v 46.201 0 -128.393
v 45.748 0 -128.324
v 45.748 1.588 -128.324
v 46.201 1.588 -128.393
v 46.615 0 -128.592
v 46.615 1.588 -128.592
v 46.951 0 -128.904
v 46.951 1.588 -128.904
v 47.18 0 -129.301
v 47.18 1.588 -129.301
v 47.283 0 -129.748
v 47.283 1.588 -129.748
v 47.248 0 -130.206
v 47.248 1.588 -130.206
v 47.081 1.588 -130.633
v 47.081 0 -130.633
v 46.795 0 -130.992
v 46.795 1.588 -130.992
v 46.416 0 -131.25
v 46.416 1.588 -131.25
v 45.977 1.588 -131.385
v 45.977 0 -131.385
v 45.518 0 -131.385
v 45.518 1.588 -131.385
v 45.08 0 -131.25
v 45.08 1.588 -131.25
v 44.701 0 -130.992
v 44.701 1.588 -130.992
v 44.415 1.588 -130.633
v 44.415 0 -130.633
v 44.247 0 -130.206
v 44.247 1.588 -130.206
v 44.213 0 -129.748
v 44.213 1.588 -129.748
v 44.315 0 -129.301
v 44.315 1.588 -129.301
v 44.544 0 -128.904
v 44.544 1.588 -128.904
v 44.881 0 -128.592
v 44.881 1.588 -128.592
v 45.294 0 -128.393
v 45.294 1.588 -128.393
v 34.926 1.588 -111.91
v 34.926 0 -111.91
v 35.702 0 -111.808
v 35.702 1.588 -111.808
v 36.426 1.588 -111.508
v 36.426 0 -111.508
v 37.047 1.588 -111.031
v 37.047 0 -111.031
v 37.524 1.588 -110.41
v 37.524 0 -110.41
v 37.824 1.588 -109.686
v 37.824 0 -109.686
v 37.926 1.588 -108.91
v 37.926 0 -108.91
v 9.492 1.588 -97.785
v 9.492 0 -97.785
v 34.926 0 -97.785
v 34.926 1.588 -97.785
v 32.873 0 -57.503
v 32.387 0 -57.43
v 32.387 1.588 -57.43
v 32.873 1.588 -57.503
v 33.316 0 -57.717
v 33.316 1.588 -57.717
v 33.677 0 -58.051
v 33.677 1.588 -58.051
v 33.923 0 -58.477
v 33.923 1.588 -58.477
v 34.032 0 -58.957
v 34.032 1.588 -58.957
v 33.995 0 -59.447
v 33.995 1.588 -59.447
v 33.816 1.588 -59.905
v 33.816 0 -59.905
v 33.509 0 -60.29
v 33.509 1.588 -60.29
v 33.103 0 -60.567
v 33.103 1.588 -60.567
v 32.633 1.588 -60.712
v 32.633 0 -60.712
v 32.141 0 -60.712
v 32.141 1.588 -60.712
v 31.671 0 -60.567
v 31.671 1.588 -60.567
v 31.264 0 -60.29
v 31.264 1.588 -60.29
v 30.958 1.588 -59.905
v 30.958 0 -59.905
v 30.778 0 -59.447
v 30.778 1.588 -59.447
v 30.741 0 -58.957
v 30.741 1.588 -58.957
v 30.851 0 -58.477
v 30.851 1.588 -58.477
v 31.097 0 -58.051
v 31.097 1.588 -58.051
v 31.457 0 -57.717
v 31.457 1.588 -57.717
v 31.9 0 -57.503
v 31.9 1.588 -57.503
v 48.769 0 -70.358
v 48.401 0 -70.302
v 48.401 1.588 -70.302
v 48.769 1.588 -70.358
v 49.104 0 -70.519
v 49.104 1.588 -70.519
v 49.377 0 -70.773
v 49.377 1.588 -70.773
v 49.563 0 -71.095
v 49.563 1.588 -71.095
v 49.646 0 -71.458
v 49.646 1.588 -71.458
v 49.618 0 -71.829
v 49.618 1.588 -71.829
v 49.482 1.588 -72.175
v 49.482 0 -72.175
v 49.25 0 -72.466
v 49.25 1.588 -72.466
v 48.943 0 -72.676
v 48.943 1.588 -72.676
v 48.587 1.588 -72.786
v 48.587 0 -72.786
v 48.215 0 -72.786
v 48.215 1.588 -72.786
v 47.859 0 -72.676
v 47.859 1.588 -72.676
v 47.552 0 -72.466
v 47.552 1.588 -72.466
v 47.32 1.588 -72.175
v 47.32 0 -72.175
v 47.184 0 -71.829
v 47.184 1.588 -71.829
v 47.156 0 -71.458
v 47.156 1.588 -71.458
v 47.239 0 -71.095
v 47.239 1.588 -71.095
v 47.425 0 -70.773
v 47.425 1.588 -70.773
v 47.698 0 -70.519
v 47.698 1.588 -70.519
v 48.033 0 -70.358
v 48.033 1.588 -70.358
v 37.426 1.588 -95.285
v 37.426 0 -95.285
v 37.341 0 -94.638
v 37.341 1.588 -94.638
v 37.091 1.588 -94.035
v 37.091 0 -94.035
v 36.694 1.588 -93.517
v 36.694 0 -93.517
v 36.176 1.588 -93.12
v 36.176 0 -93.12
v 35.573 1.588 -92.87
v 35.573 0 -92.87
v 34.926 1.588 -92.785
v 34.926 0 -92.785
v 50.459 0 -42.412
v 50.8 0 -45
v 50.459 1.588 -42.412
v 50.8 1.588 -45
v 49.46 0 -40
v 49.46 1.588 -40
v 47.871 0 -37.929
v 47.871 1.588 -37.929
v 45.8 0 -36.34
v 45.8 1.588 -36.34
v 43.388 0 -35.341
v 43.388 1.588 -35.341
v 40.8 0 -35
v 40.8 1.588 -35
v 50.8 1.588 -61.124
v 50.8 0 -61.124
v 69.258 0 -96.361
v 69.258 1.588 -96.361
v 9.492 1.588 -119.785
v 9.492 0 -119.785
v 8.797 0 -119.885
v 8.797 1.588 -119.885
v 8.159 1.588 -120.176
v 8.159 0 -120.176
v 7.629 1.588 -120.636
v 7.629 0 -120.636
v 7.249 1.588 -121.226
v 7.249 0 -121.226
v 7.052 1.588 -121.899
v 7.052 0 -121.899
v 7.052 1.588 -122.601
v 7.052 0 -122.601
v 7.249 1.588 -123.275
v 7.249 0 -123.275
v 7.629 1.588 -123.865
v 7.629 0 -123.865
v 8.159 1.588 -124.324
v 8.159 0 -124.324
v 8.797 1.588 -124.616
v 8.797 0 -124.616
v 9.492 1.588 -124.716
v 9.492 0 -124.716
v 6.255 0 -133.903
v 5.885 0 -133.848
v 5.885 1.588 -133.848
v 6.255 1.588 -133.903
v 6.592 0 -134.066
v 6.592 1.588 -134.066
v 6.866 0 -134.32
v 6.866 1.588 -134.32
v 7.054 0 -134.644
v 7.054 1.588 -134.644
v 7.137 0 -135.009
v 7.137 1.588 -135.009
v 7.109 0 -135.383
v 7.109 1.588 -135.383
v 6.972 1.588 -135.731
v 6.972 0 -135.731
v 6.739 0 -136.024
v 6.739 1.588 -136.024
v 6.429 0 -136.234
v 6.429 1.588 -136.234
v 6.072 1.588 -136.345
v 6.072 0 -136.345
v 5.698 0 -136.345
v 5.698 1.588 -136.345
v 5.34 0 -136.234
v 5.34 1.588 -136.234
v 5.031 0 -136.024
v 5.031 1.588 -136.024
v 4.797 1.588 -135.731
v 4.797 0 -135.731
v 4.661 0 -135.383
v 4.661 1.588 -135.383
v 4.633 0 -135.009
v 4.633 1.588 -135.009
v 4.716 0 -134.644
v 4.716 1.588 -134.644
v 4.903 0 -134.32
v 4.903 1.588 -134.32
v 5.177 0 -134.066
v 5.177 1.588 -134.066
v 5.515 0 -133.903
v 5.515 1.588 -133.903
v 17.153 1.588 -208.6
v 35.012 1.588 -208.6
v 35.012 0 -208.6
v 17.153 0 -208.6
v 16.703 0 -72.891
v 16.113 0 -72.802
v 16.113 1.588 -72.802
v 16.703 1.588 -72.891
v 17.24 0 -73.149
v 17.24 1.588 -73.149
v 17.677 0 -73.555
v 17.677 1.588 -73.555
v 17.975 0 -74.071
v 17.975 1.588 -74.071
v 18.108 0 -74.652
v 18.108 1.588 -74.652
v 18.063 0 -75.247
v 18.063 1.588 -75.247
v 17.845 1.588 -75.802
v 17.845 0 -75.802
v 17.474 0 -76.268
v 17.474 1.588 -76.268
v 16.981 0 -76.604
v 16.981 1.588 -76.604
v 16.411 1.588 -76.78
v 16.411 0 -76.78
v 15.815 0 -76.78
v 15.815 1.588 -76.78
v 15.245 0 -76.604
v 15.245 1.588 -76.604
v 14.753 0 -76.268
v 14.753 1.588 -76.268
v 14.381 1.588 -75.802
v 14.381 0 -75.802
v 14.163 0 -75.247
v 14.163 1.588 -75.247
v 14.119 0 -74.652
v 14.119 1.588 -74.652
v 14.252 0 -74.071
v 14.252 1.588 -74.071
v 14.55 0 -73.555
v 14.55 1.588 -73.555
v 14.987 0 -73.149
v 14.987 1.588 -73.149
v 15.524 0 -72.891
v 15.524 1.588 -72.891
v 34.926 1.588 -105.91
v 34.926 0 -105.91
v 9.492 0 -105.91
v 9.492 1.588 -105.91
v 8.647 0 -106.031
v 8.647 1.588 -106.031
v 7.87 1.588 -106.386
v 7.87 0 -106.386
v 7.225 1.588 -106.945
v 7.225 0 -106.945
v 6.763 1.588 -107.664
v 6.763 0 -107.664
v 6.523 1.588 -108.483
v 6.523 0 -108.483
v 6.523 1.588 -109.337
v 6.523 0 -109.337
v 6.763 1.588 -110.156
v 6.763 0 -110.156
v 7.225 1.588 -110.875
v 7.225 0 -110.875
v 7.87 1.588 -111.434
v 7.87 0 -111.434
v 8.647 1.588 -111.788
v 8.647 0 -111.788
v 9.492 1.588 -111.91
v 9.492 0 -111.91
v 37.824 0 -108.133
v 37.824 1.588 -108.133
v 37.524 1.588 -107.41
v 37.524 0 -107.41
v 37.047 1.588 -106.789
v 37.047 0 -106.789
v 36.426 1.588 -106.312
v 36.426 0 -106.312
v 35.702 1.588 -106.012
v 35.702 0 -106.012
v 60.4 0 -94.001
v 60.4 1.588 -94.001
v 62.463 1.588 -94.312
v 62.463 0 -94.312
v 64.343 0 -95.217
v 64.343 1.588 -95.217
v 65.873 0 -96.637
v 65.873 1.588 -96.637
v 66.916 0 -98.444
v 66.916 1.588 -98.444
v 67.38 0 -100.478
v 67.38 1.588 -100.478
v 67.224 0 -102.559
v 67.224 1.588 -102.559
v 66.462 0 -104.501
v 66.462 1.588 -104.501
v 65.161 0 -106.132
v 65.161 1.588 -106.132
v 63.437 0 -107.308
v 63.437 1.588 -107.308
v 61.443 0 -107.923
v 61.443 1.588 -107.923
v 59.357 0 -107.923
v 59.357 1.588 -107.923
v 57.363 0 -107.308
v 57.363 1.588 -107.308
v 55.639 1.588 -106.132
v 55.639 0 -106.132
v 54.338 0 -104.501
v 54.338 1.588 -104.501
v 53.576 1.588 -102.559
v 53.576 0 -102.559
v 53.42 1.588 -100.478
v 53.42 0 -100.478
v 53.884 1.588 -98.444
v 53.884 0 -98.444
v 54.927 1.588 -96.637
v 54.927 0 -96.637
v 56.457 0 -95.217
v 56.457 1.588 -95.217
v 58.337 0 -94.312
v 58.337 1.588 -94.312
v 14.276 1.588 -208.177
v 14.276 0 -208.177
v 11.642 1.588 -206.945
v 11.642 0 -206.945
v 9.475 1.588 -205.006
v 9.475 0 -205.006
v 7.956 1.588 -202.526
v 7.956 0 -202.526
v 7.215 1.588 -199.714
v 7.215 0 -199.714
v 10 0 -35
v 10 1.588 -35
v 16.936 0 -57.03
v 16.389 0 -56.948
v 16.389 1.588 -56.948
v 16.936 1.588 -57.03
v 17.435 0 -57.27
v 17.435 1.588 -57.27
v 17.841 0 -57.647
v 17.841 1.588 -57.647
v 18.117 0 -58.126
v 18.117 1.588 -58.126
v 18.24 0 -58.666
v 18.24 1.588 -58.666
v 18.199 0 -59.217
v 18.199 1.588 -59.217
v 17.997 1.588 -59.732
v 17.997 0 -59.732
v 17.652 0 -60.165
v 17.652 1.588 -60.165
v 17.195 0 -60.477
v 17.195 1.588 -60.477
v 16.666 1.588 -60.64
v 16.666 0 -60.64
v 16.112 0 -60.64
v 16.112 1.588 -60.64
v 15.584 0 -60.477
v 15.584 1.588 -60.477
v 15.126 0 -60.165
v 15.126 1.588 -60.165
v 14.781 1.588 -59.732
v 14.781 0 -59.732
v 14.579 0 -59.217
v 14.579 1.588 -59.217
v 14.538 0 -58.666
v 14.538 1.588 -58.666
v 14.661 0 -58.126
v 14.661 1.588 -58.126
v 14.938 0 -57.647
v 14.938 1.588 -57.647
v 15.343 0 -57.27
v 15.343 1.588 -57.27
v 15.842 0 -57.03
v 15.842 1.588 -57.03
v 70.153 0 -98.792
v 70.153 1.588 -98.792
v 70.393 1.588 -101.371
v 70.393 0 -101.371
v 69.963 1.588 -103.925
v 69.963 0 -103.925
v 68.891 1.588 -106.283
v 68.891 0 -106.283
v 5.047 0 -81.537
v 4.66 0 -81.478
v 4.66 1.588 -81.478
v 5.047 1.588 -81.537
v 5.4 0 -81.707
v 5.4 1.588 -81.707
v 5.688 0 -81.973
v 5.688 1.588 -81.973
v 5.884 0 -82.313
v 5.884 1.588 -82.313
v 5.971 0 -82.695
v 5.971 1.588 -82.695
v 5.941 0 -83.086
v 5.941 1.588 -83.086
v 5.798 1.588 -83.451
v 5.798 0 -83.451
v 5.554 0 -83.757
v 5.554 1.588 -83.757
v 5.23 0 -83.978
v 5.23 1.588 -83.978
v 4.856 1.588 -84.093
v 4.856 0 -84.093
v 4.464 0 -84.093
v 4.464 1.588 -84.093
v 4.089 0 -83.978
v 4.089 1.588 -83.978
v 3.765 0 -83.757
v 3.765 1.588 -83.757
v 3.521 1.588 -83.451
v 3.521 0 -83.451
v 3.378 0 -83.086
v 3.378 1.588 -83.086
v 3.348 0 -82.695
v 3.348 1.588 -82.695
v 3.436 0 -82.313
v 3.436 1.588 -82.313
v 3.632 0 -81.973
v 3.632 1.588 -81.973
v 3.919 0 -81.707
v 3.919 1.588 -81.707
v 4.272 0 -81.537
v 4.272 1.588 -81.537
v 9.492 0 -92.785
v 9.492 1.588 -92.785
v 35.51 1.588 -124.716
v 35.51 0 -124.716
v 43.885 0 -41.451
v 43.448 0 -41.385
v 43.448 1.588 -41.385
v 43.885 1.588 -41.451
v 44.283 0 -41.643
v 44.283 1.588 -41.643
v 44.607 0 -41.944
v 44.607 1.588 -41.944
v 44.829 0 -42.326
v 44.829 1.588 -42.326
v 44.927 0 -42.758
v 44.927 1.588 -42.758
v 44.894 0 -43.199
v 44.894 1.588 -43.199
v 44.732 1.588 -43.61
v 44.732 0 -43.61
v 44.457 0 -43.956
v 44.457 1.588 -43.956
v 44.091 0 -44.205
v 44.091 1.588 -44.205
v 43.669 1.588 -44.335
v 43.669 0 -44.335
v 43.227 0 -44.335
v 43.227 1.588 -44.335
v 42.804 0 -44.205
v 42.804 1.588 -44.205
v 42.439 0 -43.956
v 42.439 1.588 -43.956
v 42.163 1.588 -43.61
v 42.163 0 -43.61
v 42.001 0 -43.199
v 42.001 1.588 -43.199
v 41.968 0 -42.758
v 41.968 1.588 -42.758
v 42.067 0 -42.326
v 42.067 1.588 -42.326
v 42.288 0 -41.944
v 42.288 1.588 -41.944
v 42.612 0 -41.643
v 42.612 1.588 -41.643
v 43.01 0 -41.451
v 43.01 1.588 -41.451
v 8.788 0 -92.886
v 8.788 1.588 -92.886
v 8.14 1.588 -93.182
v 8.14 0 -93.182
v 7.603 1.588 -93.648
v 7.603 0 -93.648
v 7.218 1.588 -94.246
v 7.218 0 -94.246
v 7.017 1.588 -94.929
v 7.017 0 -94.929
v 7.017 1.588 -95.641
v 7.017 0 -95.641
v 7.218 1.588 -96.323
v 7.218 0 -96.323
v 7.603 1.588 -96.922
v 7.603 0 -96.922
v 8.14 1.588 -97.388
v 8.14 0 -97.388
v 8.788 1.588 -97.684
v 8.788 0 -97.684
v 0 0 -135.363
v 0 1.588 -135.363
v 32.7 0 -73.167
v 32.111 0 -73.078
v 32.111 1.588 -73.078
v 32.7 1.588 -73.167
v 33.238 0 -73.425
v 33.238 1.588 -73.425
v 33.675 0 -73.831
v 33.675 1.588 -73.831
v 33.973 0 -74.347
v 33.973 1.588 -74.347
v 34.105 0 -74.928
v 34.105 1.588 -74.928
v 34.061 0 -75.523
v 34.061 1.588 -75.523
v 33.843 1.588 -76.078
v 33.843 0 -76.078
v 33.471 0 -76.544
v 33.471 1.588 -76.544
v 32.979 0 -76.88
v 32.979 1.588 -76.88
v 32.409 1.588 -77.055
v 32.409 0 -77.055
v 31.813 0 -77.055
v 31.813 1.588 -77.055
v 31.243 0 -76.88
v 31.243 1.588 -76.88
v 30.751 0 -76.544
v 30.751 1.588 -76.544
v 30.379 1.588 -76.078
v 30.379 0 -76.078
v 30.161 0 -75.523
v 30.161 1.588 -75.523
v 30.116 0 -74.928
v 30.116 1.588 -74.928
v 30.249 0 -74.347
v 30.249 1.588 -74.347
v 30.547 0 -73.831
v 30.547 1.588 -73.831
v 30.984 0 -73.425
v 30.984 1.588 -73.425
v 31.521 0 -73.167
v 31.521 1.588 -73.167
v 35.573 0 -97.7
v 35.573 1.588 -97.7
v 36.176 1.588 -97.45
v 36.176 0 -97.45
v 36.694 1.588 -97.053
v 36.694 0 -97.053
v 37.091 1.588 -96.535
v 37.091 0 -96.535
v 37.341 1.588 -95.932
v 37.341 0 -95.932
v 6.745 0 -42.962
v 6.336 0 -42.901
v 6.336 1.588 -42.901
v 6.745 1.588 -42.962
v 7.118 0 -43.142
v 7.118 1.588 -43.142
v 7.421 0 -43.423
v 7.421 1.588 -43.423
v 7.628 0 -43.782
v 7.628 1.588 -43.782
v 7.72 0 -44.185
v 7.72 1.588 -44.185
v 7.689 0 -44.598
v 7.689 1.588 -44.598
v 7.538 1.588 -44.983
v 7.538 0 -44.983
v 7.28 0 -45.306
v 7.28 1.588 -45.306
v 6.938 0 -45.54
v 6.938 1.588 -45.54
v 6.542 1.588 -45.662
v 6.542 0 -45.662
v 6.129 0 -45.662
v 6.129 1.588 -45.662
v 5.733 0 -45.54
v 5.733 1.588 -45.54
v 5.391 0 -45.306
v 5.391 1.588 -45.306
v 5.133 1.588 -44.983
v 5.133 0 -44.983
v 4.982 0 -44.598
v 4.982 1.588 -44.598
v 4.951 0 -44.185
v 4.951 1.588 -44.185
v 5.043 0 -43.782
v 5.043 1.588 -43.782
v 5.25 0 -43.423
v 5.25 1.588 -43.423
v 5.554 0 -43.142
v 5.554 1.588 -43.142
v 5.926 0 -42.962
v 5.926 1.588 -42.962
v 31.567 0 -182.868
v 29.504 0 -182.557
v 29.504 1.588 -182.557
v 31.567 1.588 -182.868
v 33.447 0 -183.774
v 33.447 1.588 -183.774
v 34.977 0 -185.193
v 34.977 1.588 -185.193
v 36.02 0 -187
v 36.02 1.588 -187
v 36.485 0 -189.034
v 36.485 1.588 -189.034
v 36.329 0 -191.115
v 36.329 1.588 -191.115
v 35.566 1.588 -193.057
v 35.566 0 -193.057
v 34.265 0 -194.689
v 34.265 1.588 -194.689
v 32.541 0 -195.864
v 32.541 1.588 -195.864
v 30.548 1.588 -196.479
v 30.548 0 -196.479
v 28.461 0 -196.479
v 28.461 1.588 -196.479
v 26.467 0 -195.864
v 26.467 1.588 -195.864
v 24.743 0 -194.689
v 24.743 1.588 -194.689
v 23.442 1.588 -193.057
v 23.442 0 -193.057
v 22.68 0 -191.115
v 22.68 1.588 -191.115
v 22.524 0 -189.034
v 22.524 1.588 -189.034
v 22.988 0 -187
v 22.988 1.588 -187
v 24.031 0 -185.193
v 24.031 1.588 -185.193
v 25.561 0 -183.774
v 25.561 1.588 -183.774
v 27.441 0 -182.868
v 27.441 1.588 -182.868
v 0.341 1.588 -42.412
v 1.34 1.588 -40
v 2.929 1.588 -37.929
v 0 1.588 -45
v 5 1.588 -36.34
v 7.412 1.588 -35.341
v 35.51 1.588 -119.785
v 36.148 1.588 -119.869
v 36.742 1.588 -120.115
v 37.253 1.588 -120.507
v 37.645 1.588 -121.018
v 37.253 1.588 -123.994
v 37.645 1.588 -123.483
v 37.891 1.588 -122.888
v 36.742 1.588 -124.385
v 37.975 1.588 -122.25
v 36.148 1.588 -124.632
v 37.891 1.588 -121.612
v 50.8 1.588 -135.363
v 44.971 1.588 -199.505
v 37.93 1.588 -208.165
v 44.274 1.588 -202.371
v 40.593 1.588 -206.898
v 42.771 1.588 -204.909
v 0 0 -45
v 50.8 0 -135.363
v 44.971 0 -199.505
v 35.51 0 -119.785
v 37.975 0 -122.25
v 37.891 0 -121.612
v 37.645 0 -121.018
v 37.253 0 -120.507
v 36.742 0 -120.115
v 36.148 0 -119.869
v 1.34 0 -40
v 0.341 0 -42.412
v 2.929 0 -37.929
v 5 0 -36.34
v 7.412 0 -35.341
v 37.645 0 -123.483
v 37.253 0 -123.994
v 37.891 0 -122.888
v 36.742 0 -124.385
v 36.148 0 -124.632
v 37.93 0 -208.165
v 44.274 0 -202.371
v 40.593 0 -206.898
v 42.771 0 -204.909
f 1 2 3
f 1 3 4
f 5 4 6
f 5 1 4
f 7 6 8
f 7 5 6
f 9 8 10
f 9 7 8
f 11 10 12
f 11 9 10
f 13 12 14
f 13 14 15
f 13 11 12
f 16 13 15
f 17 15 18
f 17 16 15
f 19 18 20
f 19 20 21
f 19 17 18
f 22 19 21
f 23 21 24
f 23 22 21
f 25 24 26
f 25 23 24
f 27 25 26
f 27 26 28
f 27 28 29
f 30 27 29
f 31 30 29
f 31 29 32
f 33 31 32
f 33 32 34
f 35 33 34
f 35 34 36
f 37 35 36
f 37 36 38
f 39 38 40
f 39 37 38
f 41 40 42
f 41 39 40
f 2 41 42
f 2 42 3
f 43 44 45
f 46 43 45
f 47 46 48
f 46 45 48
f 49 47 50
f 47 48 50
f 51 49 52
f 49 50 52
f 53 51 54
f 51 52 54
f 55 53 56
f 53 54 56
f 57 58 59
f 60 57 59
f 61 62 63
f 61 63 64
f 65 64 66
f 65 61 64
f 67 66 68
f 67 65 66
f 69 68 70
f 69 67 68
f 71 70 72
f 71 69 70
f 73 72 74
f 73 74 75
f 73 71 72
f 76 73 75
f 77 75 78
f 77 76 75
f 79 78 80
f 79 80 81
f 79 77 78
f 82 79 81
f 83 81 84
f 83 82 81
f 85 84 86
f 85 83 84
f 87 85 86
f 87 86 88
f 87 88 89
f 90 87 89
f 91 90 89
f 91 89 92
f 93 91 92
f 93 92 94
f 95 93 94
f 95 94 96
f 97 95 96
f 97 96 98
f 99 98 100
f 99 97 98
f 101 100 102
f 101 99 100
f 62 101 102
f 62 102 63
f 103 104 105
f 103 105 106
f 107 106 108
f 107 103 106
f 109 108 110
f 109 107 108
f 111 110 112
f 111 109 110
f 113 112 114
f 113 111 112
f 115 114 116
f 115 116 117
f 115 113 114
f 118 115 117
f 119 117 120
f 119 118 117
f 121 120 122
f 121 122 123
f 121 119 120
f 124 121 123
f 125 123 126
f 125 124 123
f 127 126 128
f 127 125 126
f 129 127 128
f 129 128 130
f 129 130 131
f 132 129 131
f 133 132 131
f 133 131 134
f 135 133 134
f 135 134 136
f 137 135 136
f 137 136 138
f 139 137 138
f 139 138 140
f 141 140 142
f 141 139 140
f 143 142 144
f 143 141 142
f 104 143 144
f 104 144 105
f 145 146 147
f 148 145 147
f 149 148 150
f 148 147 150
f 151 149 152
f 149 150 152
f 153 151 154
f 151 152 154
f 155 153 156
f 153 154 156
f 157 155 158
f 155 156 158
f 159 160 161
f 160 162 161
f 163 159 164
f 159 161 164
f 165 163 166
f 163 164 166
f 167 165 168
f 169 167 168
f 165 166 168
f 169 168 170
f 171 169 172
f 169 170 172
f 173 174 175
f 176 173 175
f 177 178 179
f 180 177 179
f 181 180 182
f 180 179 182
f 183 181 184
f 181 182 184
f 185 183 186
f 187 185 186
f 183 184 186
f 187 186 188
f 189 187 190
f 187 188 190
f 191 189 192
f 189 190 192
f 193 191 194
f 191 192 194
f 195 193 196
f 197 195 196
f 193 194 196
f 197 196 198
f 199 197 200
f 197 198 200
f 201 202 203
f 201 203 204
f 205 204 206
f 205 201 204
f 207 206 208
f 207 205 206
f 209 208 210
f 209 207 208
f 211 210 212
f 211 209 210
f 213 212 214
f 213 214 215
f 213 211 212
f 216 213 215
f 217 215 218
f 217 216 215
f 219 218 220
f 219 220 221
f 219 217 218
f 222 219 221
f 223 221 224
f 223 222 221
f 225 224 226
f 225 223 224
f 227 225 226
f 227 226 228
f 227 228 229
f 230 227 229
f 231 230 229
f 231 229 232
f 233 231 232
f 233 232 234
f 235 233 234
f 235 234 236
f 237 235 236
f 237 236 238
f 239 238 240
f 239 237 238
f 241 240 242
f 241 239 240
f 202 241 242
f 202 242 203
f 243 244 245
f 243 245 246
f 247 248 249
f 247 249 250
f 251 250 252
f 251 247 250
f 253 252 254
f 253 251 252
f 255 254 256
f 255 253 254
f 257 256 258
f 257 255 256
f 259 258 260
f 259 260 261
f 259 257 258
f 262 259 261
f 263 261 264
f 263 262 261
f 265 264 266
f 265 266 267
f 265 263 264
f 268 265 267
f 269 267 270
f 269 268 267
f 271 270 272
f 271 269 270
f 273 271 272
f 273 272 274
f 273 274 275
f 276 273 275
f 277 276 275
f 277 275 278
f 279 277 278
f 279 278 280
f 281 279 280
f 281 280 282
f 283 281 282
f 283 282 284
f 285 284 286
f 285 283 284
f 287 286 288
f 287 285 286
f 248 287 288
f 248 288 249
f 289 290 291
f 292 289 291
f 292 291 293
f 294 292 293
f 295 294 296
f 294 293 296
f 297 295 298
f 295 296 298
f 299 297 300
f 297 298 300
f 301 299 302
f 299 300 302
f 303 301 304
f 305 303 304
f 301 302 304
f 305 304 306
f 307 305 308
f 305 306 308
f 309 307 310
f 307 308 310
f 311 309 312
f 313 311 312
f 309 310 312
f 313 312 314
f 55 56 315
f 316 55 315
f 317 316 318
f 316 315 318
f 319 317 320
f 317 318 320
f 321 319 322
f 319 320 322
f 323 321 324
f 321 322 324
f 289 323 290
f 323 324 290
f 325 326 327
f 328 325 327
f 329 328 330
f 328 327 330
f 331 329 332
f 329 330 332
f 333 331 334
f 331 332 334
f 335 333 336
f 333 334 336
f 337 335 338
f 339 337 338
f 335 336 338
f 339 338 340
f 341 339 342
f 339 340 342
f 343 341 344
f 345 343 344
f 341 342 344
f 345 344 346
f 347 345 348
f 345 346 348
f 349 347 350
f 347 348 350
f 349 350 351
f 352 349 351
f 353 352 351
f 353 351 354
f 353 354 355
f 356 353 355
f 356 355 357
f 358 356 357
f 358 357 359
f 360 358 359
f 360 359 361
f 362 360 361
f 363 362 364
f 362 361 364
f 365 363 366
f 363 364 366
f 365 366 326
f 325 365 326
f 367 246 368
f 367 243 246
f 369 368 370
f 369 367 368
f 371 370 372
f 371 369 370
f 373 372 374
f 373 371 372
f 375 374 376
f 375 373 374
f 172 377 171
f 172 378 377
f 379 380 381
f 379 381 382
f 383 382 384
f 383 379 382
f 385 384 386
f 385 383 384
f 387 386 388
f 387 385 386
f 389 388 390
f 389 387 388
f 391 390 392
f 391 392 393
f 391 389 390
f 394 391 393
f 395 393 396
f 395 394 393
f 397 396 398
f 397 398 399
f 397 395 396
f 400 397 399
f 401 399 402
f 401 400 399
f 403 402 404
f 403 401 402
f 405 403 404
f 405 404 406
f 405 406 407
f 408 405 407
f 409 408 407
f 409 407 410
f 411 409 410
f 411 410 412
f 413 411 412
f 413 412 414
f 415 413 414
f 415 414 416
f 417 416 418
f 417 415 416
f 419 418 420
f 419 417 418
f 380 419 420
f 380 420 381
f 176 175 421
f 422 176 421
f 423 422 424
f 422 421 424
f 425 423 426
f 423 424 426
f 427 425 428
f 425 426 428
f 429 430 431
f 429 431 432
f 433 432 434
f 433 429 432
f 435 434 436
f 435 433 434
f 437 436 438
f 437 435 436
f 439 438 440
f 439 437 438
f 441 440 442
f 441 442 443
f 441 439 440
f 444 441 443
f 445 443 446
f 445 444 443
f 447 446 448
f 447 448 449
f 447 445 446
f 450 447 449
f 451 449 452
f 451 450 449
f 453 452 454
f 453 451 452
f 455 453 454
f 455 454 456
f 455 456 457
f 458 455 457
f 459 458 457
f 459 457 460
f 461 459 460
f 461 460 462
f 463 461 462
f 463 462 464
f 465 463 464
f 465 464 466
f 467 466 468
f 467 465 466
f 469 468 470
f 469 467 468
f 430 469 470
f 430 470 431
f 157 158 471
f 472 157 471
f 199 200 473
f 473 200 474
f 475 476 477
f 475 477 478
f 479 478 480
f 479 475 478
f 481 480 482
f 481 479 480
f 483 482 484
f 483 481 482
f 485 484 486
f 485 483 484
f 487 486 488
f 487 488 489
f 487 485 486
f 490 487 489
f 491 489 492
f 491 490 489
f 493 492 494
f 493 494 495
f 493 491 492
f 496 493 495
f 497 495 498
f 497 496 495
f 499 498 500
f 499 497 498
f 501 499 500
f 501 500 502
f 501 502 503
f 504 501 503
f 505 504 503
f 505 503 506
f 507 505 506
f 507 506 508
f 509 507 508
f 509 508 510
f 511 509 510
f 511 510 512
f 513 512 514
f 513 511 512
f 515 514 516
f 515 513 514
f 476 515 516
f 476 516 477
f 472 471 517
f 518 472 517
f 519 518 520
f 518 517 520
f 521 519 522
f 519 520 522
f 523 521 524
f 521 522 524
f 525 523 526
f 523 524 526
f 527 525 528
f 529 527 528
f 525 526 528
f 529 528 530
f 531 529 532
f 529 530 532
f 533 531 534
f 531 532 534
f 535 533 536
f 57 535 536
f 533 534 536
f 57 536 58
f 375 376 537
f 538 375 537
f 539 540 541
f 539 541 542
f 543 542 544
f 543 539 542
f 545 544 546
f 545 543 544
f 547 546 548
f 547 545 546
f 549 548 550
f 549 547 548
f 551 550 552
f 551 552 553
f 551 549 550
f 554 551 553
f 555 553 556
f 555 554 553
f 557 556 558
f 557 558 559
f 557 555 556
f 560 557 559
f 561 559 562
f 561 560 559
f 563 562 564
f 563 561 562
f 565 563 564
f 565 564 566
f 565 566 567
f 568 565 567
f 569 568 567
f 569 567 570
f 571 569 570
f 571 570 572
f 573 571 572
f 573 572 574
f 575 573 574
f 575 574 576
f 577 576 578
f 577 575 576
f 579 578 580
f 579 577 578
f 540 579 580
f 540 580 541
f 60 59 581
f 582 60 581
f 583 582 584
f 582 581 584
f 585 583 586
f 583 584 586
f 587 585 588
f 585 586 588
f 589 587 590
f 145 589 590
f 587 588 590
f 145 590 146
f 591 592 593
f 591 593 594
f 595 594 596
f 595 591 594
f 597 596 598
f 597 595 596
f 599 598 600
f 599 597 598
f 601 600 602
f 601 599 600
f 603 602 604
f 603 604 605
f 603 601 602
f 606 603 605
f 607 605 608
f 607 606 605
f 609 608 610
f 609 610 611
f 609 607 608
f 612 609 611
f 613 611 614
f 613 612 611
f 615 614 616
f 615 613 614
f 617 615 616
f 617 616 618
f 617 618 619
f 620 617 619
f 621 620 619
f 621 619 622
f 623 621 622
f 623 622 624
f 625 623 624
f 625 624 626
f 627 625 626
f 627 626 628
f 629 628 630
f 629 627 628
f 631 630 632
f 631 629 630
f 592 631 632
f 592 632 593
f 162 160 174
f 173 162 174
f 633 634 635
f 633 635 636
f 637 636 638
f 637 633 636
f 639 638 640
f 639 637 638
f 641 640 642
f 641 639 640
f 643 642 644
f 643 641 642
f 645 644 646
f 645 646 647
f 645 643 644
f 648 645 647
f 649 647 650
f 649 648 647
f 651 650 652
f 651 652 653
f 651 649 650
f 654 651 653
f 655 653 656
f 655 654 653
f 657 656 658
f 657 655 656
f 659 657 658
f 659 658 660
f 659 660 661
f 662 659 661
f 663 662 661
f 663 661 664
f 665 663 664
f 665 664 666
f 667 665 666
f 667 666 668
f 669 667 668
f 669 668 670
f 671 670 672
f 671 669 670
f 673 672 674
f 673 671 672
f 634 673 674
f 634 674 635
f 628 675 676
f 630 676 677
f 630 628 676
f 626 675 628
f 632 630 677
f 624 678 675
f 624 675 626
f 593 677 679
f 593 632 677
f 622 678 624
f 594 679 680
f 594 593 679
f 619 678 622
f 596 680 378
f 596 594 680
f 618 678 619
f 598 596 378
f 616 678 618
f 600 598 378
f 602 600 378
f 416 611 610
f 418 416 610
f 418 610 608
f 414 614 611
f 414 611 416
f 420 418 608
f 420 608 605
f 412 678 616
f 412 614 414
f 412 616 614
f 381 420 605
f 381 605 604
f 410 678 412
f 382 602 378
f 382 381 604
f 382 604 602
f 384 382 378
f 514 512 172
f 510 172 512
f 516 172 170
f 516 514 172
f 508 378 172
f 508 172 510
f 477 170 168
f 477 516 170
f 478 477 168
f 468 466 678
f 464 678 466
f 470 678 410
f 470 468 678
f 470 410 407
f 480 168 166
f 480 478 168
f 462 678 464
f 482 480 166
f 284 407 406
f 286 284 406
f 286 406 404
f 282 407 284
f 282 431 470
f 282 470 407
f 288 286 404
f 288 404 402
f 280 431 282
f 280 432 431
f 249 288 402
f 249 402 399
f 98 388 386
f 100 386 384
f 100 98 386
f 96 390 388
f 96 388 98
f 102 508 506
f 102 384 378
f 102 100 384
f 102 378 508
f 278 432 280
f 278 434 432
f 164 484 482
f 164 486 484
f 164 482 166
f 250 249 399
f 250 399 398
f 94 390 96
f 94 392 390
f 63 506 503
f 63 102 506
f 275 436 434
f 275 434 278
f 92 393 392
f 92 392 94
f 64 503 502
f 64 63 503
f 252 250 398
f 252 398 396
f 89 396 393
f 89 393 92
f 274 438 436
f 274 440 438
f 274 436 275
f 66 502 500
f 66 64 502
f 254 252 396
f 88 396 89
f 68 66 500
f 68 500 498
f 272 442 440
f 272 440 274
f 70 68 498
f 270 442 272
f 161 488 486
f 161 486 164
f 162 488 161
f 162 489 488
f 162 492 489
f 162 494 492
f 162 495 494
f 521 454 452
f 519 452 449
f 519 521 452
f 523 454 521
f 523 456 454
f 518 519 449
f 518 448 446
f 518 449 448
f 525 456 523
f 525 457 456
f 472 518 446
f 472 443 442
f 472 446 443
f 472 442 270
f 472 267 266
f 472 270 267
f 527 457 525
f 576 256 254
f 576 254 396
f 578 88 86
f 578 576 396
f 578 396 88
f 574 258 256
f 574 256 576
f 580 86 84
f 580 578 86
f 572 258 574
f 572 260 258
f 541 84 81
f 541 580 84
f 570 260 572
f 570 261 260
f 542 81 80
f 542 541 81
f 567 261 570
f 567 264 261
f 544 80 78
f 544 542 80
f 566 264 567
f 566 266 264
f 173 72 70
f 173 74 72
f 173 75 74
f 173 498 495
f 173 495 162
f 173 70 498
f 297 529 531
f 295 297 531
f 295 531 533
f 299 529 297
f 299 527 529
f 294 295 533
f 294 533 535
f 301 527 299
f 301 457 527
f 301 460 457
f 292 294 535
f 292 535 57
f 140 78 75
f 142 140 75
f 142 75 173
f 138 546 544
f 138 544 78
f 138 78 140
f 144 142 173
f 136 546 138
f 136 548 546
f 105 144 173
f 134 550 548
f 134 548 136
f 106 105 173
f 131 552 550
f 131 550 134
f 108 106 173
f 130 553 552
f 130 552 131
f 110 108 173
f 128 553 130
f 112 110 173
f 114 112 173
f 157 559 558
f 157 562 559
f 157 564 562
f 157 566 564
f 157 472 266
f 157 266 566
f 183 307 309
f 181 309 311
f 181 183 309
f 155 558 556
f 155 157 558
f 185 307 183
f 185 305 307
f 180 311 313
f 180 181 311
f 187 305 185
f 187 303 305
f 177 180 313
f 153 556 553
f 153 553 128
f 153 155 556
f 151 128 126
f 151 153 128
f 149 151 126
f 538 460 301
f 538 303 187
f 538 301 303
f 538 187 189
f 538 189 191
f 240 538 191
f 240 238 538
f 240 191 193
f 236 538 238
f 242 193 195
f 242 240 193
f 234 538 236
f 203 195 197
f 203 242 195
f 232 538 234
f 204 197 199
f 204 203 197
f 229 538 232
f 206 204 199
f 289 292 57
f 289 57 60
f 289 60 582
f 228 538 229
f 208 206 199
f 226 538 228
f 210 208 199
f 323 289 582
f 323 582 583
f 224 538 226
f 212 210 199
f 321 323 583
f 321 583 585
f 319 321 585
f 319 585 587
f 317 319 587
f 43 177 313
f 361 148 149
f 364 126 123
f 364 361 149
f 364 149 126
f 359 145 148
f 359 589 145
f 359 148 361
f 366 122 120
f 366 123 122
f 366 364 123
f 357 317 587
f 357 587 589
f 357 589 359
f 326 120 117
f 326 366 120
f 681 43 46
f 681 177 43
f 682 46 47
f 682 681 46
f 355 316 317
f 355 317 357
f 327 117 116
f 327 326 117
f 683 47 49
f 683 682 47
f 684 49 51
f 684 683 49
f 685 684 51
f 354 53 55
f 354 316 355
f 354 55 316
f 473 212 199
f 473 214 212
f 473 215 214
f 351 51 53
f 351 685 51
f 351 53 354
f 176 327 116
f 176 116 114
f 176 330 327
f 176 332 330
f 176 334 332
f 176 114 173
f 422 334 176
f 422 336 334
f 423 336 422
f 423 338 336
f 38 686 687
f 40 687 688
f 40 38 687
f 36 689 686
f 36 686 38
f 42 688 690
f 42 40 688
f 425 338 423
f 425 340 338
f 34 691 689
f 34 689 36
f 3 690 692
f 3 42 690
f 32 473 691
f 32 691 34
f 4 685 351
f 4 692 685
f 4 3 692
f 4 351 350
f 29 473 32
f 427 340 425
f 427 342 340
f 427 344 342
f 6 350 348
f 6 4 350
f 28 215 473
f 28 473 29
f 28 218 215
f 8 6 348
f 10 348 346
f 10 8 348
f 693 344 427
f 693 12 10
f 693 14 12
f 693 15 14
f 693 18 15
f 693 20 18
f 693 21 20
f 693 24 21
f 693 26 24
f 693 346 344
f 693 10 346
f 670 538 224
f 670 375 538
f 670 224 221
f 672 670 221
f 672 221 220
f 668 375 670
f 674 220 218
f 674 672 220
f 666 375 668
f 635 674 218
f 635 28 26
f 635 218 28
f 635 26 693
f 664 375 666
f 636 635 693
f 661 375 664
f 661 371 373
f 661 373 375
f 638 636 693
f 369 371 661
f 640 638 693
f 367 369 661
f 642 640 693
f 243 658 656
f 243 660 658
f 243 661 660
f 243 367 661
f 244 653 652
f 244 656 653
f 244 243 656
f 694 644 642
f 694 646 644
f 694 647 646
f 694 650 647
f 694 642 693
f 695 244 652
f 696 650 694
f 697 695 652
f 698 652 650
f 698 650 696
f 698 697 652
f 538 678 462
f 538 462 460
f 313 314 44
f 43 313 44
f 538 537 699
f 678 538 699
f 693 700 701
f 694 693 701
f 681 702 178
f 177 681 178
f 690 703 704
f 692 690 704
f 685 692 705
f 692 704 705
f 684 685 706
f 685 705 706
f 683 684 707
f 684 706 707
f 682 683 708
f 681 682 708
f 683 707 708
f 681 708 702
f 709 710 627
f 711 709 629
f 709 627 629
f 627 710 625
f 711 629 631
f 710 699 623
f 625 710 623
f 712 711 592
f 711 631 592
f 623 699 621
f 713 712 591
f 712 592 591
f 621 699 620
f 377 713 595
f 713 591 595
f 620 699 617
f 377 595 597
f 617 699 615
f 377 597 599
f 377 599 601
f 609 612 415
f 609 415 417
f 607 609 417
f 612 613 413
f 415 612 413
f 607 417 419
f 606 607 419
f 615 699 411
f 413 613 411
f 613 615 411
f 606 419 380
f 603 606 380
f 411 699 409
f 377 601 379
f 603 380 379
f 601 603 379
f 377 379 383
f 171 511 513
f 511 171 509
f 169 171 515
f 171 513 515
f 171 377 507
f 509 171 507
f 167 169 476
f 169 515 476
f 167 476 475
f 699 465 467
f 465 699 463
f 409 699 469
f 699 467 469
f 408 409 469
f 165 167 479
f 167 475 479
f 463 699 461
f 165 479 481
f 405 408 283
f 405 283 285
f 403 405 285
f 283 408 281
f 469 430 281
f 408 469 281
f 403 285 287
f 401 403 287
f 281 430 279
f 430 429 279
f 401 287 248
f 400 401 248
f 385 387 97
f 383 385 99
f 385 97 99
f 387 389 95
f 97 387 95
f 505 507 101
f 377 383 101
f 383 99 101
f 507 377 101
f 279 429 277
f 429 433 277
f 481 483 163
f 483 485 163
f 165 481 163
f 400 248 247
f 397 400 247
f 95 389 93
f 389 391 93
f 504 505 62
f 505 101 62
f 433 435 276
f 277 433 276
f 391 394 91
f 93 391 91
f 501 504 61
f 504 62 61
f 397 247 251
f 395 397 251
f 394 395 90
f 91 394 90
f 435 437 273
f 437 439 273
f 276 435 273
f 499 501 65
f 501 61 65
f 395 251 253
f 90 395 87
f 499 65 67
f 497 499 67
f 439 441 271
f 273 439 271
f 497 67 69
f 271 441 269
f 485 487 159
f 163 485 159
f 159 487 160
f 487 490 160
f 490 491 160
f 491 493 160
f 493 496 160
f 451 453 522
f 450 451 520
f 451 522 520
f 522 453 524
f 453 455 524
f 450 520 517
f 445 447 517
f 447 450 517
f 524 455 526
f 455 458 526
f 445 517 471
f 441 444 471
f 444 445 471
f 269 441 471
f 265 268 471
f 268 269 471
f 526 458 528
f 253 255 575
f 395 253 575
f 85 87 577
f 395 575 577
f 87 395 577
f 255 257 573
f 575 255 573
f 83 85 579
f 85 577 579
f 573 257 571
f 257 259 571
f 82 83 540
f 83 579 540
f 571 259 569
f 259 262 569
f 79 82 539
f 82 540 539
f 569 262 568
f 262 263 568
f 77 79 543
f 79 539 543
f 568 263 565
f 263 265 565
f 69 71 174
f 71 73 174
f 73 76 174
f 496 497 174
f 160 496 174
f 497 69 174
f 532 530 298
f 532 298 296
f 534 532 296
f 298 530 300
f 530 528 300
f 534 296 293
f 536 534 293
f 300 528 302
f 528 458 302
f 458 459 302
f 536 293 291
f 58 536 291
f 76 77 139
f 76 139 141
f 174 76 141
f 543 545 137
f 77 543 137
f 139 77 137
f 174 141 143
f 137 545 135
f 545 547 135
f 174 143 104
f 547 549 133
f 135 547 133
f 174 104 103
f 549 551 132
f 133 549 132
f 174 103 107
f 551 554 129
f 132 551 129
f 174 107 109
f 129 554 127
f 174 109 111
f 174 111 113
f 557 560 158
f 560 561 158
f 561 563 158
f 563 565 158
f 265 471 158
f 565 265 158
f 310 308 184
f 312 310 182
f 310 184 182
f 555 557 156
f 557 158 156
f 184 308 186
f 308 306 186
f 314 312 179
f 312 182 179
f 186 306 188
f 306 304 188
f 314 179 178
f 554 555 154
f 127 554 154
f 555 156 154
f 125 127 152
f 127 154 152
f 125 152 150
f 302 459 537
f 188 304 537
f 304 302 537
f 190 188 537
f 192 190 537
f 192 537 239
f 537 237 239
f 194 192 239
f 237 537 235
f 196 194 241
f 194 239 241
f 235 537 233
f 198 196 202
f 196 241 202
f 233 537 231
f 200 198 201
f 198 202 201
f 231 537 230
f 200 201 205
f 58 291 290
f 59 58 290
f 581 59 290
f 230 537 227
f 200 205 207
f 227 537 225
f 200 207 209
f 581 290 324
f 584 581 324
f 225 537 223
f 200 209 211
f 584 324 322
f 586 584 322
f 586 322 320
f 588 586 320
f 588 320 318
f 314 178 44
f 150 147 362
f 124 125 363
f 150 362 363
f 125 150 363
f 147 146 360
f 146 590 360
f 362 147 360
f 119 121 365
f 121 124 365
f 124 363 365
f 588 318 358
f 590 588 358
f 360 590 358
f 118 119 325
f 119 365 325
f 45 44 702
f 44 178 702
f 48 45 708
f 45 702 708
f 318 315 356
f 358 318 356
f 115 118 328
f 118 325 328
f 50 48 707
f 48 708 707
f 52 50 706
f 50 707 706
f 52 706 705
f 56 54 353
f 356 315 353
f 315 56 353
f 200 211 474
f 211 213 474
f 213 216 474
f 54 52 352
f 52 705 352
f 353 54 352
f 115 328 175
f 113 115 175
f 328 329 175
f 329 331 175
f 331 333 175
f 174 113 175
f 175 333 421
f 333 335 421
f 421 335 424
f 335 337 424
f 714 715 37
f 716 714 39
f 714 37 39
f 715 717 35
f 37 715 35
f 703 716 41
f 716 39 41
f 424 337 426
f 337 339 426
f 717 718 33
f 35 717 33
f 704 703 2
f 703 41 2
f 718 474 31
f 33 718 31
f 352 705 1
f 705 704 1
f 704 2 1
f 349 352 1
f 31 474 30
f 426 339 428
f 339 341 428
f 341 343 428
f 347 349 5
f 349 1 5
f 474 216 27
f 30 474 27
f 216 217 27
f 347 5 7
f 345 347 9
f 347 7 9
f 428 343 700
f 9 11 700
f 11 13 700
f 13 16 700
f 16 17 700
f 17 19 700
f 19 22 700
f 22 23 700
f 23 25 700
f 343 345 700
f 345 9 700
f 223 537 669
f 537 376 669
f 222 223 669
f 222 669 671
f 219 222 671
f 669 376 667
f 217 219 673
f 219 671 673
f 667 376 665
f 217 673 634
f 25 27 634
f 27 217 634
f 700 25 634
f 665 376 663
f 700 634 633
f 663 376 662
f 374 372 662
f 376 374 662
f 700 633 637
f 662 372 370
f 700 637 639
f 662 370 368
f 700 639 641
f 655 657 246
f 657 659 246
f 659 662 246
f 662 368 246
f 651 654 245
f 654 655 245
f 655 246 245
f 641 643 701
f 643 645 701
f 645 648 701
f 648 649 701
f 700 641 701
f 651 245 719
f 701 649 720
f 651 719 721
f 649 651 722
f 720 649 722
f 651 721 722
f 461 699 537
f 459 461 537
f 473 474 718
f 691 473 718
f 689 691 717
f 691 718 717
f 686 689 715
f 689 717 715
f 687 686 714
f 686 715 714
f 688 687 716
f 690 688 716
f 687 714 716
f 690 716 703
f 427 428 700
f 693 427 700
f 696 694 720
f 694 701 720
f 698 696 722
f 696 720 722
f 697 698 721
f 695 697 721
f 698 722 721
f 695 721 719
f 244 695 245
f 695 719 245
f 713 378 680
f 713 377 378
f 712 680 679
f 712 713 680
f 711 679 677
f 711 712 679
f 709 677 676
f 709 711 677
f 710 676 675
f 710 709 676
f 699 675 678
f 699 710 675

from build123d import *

# Parameters (mm, degrees)
SKETCH1_R           = 1.388229101
SKETCH1_R_2         = 1.314910669
SKETCH1_R_3         = 1.856429035
SKETCH1_R_4         = 2
SKETCH1_R_5         = 1.65
SKETCH1_R_6         = 1.483383261
SKETCH1_R_7         = 1.248623853
SKETCH1_R_8         = 1.255629307
SKETCH1_R_9         = 7
SKETCH1_R_10        = 1.53911217
BOSS_EXTRUDE1_DEPTH = 1.5875
SKETCH4_W           = 66.272407177
SKETCH4_H           = 27.800260981
CUT_EXTRUDE2_DEPTH  = 20
FILLET3_R           = 10
FILLET4_R           = 10
BOSS_EXTRUDE3_START = -1.5875
BOSS_EXTRUDE3_DEPTH = 1.5875
SKETCH7_R           = 7
CUT_EXTRUDE3_DEPTH  = 1.5875
SKETCH8_W           = 100.106183873
SKETCH8_H           = 60.21728362
CUT_EXTRUDE4_DEPTH  = 35
FILLET5_R           = 10


with BuildPart() as part:
    # Sketch1 → Boss-Extrude1 (new body)
    with BuildSketch(Plane(origin=(0, 0, 0), x_dir=(1, 0, 0), z_dir=(0, 1, 0))):
        with BuildLine():
            Line((42.32729629, 228.6), (10.454309325, 228.6))
            Line((10.454309325, 228.6), (0, 135.362739137))
            Line((0, 135.362739137), (0, 0))
            Line((0, 0), (24.327009544, 0))
            Line((24.327009544, 0), (50.8, 0))
            Line((50.8, 0), (50.8, 64.87909603))
            Line((50.8, 64.87909603), (50.8, 87.423477361))
            Line((50.8, 87.423477361), (50.8, 98.200996728))
            ThreePointArc((50.8, 98.200996728), (50.4, 101.000996728), (50.8, 103.800996728))
            Line((50.8, 103.800996728), (50.8, 104.488200565))
            Line((50.8, 104.488200565), (50.8, 120.619222808))
            Line((50.8, 120.619222808), (50.8, 135.362739137))
            Line((50.8, 135.362739137), (42.32729629, 228.6))
        make_face()
        with Locations(Location((6.335590122, 44.288799513, 0), (0, 0, 270))):
            Circle(SKETCH1_R, mode=Mode.SUBTRACT)
        with Locations(Location((4.659546827, 82.793173401, 0), (0, 0, 270))):
            Circle(SKETCH1_R_2, mode=Mode.SUBTRACT)
        with Locations(Location((16.389129236, 58.804246097, 0), (0, 0, 270))):
            Circle(SKETCH1_R_3, mode=Mode.SUBTRACT)
        with Locations(Location((16.113249369, 74.801867492, 0), (0, 0, 270))):
            Circle(SKETCH1_R_4, mode=Mode.SUBTRACT)
        with Locations(Location((32.386750631, 59.080125965, 0), (0, 0, 270))):
            Circle(SKETCH1_R_5, mode=Mode.SUBTRACT)
        with Locations(Location((32.110870764, 75.07774736, 0), (0, 0, 270))):
            Circle(SKETCH1_R_4, mode=Mode.SUBTRACT)
        with BuildLine():
            Line((34.925740903, 92.78493524), (9.492033273, 92.78493524))
            ThreePointArc((9.492033273, 92.78493524), (6.992033273, 95.28493524), (9.492033273, 97.78493524))
            Line((9.492033273, 97.78493524), (34.925740903, 97.78493524))
            ThreePointArc((34.925740903, 97.78493524), (36.693507856, 97.052702193), (37.425740903, 95.28493524))
            ThreePointArc((37.425740903, 95.28493524), (36.693507856, 93.517168287), (34.925740903, 92.78493524))
        make_face(mode=Mode.SUBTRACT)
        with BuildLine():
            Line((34.925740903, 105.90993524), (9.492033273, 105.90993524))
            ThreePointArc((9.492033273, 105.90993524), (6.492033273, 108.90993524), (9.492033273, 111.90993524))
            Line((9.492033273, 111.90993524), (34.925740903, 111.90993524))
            ThreePointArc((34.925740903, 111.90993524), (37.047061246, 111.031255584), (37.925740903, 108.90993524))
            ThreePointArc((37.925740903, 108.90993524), (37.047061246, 106.788614896), (34.925740903, 105.90993524))
        make_face(mode=Mode.SUBTRACT)
        with Locations(Location((43.447673368, 42.868436544, 0), (0, 0, 270))):
            Circle(SKETCH1_R_6, mode=Mode.SUBTRACT)
        with Locations(Location((48.400988852, 71.551011715, 0), (0, 0, 270))):
            Circle(SKETCH1_R_7, mode=Mode.SUBTRACT)
        with Locations(Location((5.88467603, 135.103145298, 0), (0, 0, 270))):
            Circle(SKETCH1_R_8, mode=Mode.SUBTRACT)
        with BuildLine():
            Line((35.509675341, 119.784935244), (9.492033273, 119.784935244))
            ThreePointArc((9.492033273, 119.784935244), (7.026609419, 122.250359097), (9.492033273, 124.71578295))
            Line((9.492033273, 124.71578295), (35.509675341, 124.71578295))
            ThreePointArc((35.509675341, 124.71578295), (37.252993266, 123.993677022), (37.975099194, 122.250359097))
            ThreePointArc((37.975099194, 122.250359097), (37.252993266, 120.507041172), (35.509675341, 119.784935244))
        make_face(mode=Mode.SUBTRACT)
        with Locations(Location((29.504213454, 189.557234372, 0), (0, 0, 270))):
            Circle(SKETCH1_R_9, mode=Mode.SUBTRACT)
        with Locations(Location((45.747747887, 129.863467374, 0), (0, 0, 270))):
            Circle(SKETCH1_R_10, mode=Mode.SUBTRACT)
    extrude(amount=BOSS_EXTRUDE1_DEPTH)

    # Sketch4 → Cut-Extrude2 (cut)
    with BuildSketch(Plane(origin=(0, 0, -228.6), x_dir=(-1, 0, 0), z_dir=(0, 0, -1))):
        with Locations((-28.174690156, -1.980940155)):
            Rectangle(SKETCH4_W, SKETCH4_H)
    extrude(amount=-CUT_EXTRUDE2_DEPTH, mode=Mode.SUBTRACT)

    # Fillet3
    fillet3_edges = [part.edges().sort_by_distance(p)[0] for p in [
        (44.144746445, 0.79375, -208.6),
    ]]
    fillet(fillet3_edges, radius=FILLET3_R)

    # Fillet4
    fillet4_edges = [part.edges().sort_by_distance(p)[0] for p in [
        (50.8, 0.79375, 0),
        (0, 0.79375, 0),
        (8.211791854, 0.79375, -208.6),
    ]]
    fillet(fillet4_edges, radius=FILLET4_R)

    # Sketch6 → Boss-Extrude3 (add)
    with BuildSketch(Plane(origin=(0, 1.5875, 0), x_dir=(1, 0, 0), z_dir=(0, 1, 0)).offset(BOSS_EXTRUDE3_START)):
        with BuildLine():
            Line((50.8, 135.362739137), (50.8, 103.800996728))
            ThreePointArc((50.8, 103.800996728), (50.4, 101.000996728), (50.8, 98.200996728))
            Line((50.8, 98.200996728), (50.8, 61.124243317))
            Line((50.8, 61.124243317), (69.258211507, 96.360728536))
            ThreePointArc((69.258211507, 96.360728536), (70.393157133, 101.370875786), (68.890940865, 106.283413148))
            Line((68.890940865, 106.283413148), (50.8, 135.362739137))
        make_face()
    extrude(amount=BOSS_EXTRUDE3_DEPTH)

    # Sketch7 → Cut-Extrude3 (cut)
    with BuildSketch(Plane(origin=(0, 1.5875, 0), x_dir=(1, 0, 0), z_dir=(0, 1, 0))):
        with Locations(Location((60.4, 101.000996728, 0), (0, 0, 270))):
            Circle(SKETCH7_R)
    extrude(amount=-CUT_EXTRUDE3_DEPTH, mode=Mode.SUBTRACT)

    # Sketch8 → Cut-Extrude4 (cut)
    with BuildSketch(Plane.XY):
        with Locations((28.455154517, 1.704032249)):
            Rectangle(SKETCH8_W, SKETCH8_H)
    extrude(amount=-CUT_EXTRUDE4_DEPTH, mode=Mode.SUBTRACT)

    # Fillet5
    fillet5_edges = [part.edges().sort_by_distance(p)[0] for p in [
        (0, 0.79375, -35),
        (50.8, 0.79375, -35),
    ]]
    fillet(fillet5_edges, radius=FILLET5_R)


solid = part.part
